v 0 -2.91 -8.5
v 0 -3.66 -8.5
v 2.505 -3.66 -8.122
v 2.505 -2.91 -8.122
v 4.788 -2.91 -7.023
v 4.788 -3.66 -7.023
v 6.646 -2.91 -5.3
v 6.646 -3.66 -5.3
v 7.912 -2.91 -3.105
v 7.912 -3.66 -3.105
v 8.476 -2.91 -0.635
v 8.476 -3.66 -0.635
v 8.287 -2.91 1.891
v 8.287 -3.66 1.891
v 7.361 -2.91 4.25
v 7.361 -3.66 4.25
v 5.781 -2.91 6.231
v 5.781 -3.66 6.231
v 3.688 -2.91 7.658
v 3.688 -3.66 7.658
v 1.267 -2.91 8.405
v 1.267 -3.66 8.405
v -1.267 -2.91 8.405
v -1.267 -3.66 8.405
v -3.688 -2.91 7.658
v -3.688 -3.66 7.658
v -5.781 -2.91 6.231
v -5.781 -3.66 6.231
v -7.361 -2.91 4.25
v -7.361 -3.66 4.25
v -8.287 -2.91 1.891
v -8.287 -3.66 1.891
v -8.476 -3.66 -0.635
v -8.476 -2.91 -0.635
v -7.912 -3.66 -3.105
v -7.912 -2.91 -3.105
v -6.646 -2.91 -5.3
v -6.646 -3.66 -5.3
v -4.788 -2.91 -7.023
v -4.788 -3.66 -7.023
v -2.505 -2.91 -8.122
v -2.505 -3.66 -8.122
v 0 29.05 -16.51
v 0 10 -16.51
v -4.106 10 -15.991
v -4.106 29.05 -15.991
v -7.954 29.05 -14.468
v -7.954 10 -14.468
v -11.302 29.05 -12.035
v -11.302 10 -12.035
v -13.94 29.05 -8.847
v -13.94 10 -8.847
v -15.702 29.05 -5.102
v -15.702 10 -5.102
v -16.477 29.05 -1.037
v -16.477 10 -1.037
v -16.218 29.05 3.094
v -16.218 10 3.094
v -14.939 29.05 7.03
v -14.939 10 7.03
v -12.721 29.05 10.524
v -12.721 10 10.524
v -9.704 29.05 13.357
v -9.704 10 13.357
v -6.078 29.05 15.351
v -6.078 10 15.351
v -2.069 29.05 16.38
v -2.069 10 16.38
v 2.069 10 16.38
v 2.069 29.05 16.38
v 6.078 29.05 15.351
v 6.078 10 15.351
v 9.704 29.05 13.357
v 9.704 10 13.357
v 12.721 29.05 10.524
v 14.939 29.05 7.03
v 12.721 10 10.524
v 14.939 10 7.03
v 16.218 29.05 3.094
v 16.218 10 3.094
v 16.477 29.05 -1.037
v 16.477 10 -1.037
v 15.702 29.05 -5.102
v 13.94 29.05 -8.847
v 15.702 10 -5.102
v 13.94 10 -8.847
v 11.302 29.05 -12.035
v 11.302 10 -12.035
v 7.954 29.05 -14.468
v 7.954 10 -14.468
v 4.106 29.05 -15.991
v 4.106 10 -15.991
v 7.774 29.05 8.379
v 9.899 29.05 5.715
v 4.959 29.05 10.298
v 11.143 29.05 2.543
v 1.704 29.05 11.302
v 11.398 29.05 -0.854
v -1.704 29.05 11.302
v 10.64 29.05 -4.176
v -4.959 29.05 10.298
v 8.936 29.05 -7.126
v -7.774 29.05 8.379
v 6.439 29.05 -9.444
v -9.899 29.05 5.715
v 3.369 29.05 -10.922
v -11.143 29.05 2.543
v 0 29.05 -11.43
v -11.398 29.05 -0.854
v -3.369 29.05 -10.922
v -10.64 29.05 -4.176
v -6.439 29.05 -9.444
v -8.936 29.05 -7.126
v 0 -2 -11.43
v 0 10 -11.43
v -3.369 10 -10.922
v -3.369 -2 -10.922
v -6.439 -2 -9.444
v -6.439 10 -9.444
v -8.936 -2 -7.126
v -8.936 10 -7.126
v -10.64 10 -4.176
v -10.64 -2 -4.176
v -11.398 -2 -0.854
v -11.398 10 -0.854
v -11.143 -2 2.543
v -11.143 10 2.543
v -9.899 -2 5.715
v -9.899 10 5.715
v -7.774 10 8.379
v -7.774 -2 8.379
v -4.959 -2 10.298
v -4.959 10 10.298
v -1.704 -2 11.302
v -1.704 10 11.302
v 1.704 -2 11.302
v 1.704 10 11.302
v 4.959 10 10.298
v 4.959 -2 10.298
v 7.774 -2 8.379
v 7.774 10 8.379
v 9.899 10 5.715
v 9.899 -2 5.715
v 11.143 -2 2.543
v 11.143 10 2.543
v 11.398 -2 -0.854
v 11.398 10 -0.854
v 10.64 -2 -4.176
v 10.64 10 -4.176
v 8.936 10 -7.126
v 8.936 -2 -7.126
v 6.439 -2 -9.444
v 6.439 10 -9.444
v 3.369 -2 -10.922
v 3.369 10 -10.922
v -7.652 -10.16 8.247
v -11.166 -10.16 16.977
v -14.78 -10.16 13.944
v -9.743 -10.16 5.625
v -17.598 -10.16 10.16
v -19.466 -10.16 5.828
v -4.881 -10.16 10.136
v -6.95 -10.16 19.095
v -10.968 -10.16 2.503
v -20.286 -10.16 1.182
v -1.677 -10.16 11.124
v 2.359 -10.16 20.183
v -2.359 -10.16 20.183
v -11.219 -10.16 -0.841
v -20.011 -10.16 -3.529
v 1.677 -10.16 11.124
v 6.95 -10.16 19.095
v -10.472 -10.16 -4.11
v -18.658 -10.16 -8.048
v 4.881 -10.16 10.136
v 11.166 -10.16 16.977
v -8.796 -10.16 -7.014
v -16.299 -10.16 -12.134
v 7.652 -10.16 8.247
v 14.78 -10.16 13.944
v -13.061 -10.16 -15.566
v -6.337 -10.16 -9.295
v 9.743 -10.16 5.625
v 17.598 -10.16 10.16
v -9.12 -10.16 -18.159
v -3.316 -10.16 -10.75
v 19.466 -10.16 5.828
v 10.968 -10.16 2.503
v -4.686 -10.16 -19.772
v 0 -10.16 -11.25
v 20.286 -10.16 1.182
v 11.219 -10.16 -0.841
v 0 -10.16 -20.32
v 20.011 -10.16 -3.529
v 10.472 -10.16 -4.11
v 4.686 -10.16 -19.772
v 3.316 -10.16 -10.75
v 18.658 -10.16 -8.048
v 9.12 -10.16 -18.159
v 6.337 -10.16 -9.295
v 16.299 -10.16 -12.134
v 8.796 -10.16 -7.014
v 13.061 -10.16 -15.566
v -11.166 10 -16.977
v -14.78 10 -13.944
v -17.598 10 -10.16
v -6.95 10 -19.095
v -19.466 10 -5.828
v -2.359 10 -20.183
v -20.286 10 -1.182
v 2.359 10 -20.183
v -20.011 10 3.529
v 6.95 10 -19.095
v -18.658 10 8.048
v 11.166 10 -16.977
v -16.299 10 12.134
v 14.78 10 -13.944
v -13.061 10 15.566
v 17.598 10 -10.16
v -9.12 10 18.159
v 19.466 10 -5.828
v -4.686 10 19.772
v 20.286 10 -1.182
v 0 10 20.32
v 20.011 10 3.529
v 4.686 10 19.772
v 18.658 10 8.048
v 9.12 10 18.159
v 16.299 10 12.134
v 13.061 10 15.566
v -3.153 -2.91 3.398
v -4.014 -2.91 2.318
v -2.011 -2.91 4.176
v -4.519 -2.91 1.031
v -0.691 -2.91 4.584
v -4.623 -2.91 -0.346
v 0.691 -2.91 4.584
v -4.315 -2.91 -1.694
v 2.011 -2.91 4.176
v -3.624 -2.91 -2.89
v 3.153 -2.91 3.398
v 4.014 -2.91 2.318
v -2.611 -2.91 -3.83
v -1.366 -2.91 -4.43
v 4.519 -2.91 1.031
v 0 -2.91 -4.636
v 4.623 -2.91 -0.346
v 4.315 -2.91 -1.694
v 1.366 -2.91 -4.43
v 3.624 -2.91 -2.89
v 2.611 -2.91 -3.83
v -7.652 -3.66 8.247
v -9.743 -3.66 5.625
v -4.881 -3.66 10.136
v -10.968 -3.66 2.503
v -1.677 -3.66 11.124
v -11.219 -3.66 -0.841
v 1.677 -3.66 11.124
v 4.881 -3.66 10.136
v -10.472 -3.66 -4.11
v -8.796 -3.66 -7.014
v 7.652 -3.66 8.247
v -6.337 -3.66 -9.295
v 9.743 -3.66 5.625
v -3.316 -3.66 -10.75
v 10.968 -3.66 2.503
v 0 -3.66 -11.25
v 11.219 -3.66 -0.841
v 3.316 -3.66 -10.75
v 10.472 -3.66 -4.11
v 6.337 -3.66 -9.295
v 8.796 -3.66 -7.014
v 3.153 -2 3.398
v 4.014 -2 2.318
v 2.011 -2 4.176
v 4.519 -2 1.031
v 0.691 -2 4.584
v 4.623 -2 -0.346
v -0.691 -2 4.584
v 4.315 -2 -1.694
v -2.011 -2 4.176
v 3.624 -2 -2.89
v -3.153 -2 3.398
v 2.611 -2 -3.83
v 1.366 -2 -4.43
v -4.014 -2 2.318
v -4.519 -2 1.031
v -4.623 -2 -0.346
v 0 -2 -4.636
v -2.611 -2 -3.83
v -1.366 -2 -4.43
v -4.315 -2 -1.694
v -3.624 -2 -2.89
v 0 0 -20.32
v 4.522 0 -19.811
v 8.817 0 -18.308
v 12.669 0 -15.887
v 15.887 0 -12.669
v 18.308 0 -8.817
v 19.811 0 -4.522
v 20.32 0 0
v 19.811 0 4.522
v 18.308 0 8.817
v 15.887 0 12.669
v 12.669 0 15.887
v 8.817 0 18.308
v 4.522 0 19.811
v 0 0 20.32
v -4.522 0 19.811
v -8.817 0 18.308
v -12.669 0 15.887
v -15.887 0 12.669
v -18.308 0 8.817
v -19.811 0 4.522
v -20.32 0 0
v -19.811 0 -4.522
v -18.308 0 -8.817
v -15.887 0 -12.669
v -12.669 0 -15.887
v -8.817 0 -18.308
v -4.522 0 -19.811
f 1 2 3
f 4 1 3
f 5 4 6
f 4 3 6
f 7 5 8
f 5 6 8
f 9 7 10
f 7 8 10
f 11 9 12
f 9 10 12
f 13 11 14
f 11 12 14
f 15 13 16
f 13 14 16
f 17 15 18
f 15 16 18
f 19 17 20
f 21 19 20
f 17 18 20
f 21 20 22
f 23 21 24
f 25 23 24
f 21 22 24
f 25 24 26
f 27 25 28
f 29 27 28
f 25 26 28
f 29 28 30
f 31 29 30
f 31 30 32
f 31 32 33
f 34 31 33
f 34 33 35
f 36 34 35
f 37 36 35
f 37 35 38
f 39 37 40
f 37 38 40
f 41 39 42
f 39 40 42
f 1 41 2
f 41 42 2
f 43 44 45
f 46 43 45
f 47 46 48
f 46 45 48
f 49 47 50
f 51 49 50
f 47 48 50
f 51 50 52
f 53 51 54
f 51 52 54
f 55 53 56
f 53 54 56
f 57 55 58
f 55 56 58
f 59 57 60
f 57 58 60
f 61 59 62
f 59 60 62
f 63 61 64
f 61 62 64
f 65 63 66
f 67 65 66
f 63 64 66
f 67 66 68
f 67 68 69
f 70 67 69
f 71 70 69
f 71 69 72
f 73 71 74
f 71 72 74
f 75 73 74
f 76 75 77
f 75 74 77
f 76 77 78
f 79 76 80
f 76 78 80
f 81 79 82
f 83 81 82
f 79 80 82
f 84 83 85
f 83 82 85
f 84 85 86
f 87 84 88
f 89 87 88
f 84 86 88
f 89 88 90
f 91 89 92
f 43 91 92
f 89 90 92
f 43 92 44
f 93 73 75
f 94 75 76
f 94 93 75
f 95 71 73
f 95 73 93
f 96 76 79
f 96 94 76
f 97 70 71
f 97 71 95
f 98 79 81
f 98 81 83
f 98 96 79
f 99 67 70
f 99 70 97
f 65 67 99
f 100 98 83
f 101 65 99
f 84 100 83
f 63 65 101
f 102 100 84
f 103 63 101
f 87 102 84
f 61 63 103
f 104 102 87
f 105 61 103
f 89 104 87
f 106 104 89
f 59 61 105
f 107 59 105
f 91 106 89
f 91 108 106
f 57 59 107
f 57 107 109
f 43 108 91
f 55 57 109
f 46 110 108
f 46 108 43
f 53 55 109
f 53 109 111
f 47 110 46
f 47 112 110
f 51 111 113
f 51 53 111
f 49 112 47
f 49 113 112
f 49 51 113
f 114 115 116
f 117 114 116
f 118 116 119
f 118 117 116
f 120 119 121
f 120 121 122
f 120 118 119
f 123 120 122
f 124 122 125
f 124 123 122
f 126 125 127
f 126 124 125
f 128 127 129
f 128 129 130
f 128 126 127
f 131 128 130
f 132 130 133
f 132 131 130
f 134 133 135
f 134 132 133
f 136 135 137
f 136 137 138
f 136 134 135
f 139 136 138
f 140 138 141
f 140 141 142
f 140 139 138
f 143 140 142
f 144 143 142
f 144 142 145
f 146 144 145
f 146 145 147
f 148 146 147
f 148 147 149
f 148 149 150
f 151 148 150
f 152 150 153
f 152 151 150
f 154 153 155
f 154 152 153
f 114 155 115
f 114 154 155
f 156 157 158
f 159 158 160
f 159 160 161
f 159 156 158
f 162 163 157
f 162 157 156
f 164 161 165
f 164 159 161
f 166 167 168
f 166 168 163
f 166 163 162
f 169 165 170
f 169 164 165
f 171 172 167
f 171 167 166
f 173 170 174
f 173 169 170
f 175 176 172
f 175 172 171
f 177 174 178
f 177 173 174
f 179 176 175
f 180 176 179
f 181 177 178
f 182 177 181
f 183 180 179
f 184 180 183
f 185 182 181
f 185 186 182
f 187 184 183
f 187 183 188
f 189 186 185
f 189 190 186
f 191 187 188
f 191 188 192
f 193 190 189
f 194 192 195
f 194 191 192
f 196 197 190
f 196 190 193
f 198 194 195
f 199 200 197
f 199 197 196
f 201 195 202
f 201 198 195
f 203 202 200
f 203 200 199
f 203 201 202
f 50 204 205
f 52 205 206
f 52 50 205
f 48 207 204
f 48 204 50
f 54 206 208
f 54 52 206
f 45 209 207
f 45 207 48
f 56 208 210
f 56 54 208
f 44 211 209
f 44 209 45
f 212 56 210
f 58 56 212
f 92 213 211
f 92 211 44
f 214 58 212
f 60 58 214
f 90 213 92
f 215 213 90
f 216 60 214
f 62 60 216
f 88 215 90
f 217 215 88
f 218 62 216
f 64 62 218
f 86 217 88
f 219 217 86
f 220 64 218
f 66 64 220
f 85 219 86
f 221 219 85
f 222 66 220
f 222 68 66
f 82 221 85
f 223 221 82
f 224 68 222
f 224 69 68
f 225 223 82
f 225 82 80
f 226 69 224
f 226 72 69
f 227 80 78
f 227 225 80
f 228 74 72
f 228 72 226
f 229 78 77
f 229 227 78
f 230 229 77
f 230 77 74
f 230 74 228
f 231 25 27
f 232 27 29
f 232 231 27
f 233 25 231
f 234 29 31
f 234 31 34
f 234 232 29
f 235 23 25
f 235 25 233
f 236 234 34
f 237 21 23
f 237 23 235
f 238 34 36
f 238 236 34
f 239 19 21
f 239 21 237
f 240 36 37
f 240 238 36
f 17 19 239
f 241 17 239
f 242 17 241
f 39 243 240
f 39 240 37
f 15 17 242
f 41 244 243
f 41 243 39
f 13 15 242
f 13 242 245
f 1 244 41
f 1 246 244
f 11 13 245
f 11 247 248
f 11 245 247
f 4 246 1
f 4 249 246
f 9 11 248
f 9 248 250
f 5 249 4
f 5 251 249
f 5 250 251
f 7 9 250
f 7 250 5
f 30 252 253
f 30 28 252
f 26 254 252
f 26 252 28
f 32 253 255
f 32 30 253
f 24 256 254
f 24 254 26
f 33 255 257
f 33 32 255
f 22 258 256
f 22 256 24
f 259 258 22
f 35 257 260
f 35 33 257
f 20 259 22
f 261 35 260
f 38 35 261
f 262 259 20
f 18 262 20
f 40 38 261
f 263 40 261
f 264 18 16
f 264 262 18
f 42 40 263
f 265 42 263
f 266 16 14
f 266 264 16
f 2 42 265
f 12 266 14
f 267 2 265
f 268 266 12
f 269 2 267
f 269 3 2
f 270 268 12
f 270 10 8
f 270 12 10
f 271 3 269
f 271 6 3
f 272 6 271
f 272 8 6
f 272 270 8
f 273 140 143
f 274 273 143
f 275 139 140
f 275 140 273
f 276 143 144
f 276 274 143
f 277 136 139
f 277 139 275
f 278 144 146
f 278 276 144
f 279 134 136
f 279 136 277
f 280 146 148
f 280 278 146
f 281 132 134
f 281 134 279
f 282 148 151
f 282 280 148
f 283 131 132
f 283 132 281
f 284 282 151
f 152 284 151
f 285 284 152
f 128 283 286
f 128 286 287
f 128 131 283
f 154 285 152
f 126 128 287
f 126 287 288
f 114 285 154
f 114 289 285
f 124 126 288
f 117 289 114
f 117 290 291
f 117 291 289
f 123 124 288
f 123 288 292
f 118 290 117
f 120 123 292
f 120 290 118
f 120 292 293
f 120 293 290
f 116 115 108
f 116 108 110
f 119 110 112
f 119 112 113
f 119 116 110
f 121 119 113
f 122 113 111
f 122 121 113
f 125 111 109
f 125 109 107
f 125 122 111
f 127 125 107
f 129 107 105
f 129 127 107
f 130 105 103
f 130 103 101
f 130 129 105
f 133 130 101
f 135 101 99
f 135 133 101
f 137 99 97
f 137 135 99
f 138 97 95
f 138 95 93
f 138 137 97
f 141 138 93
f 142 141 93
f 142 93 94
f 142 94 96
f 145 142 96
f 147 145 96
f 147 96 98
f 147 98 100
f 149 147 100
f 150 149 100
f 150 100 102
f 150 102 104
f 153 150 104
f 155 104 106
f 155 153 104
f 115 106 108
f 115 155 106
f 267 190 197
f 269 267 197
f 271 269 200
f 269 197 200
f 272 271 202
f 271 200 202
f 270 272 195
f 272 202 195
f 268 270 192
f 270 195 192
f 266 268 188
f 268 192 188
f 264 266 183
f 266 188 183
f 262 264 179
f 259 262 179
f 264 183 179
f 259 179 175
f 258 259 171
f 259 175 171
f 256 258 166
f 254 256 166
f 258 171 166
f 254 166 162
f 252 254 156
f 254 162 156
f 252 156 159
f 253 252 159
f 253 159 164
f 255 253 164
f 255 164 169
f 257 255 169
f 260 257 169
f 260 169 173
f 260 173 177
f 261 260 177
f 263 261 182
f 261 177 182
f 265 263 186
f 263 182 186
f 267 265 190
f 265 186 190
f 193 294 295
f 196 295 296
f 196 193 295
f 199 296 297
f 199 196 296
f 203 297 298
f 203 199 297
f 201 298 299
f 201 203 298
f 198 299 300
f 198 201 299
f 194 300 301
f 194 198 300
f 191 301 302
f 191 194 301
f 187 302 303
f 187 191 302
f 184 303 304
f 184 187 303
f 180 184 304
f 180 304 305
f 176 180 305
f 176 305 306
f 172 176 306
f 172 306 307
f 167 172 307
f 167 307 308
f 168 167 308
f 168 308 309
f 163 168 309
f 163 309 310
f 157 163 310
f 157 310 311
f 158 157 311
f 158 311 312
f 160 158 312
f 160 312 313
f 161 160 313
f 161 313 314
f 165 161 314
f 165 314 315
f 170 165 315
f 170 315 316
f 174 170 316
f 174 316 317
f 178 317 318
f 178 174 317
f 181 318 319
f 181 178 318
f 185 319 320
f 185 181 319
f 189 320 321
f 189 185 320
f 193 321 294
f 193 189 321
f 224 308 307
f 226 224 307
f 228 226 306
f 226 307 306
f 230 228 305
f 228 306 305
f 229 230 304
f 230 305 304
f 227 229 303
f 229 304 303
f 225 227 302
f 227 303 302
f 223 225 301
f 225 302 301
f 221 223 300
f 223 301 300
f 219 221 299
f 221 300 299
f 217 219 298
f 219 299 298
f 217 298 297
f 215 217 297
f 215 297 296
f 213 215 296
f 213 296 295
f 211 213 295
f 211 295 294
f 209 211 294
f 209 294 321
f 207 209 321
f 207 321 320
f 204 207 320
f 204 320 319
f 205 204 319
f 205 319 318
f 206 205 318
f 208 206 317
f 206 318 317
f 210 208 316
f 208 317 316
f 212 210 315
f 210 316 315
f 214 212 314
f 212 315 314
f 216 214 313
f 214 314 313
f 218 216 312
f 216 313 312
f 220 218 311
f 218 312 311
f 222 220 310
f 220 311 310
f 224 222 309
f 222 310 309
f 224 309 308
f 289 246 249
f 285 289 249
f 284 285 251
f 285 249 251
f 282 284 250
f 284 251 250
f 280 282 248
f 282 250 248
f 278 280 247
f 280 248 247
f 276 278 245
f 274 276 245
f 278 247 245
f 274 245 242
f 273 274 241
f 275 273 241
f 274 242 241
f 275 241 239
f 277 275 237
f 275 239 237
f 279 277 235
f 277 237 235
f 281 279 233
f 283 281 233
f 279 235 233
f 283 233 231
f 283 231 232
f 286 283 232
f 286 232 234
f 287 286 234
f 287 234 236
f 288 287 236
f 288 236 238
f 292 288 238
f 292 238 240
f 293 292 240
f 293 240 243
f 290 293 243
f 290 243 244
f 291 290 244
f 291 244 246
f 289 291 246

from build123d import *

# Parameters (mm, degrees)
SKETCH1_R           = 20.32
SKETCH1_R_2         = 4.6355
BOSS_EXTRUDE1_DEPTH = 10
SKETCH2_R           = 16.51
SKETCH2_R_2         = 11.43
BOSS_EXTRUDE2_DEPTH = 19.05
BOSS_EXTRUDE3_START = 10.16
SKETCH3_R           = 20.32
SKETCH3_R_2         = 4.6355
BOSS_EXTRUDE3_DEPTH = 10.16
CUT_EXTRUDE1_START  = -12
SKETCH4_R           = 11.43
CUT_EXTRUDE1_DEPTH  = 12
SKETCH6_R           = 11.25
CUT_EXTRUDE3_DEPTH  = 6.5
SKETCH7_R           = 8.5
CUT_EXTRUDE4_DEPTH  = 0.75


with BuildPart() as part:
    # Sketch1 → Boss-Extrude1 (new body)
    with BuildSketch(Plane(origin=(0, 0, 0), x_dir=(1, 0, 0), z_dir=(0, 1, 0))):
        with Locations(Location((0, 0, 0), (0, 0, 270))):
            Circle(SKETCH1_R)
        with Locations(Location((0, 0, 0), (0, 0, 270))):
            Circle(SKETCH1_R_2, mode=Mode.SUBTRACT)
    extrude(amount=BOSS_EXTRUDE1_DEPTH)

    # Sketch2 → Boss-Extrude2 (add)
    with BuildSketch(Plane(origin=(0, 10, 0), x_dir=(1, 0, 0), z_dir=(0, 1, 0))):
        with Locations(Location((0, 0, 0), (0, 0, 90))):
            Circle(SKETCH2_R)
        with Locations(Location((0, 0, 0), (0, 0, 90))):
            Circle(SKETCH2_R_2, mode=Mode.SUBTRACT)
    extrude(amount=BOSS_EXTRUDE2_DEPTH)

    # Sketch3 → Boss-Extrude3 (add)
    with BuildSketch(Plane(origin=(0, 0, 0), x_dir=(-1, 0, 0), z_dir=(0, -1, 0)).offset(BOSS_EXTRUDE3_START)):
        with Locations(Location((0, 0, 0), (0, 0, 90))):
            Circle(SKETCH3_R)
        with Locations(Location((0, 0, 0), (0, 0, 90))):
            Circle(SKETCH3_R_2, mode=Mode.SUBTRACT)
    extrude(amount=-BOSS_EXTRUDE3_DEPTH)

    # Sketch4 → Cut-Extrude1 (cut)
    with BuildSketch(Plane(origin=(0, 10, 0), x_dir=(1, 0, 0), z_dir=(0, 1, 0)).offset(CUT_EXTRUDE1_START)):
        with Locations(Location((0, 0, 0), (0, 0, 90))):
            Circle(SKETCH4_R)
    extrude(amount=CUT_EXTRUDE1_DEPTH, mode=Mode.SUBTRACT)

    # Sketch6 → Cut-Extrude3 (cut)
    with BuildSketch(Plane.XZ.offset(10.16)):
        with Locations(Location((0, 0, 0), (0, 0, 270))):
            Circle(SKETCH6_R)
    extrude(amount=-CUT_EXTRUDE3_DEPTH, mode=Mode.SUBTRACT)

    # Sketch7 → Cut-Extrude4 (cut)
    with BuildSketch(Plane(origin=(0, -3.66, 0), x_dir=(-1, 0, 0), z_dir=(0, -1, 0))):
        with Locations(Location((0, 0, 0), (0, 0, 90))):
            Circle(SKETCH7_R)
    extrude(amount=-CUT_EXTRUDE4_DEPTH, mode=Mode.SUBTRACT)


solid = part.part
